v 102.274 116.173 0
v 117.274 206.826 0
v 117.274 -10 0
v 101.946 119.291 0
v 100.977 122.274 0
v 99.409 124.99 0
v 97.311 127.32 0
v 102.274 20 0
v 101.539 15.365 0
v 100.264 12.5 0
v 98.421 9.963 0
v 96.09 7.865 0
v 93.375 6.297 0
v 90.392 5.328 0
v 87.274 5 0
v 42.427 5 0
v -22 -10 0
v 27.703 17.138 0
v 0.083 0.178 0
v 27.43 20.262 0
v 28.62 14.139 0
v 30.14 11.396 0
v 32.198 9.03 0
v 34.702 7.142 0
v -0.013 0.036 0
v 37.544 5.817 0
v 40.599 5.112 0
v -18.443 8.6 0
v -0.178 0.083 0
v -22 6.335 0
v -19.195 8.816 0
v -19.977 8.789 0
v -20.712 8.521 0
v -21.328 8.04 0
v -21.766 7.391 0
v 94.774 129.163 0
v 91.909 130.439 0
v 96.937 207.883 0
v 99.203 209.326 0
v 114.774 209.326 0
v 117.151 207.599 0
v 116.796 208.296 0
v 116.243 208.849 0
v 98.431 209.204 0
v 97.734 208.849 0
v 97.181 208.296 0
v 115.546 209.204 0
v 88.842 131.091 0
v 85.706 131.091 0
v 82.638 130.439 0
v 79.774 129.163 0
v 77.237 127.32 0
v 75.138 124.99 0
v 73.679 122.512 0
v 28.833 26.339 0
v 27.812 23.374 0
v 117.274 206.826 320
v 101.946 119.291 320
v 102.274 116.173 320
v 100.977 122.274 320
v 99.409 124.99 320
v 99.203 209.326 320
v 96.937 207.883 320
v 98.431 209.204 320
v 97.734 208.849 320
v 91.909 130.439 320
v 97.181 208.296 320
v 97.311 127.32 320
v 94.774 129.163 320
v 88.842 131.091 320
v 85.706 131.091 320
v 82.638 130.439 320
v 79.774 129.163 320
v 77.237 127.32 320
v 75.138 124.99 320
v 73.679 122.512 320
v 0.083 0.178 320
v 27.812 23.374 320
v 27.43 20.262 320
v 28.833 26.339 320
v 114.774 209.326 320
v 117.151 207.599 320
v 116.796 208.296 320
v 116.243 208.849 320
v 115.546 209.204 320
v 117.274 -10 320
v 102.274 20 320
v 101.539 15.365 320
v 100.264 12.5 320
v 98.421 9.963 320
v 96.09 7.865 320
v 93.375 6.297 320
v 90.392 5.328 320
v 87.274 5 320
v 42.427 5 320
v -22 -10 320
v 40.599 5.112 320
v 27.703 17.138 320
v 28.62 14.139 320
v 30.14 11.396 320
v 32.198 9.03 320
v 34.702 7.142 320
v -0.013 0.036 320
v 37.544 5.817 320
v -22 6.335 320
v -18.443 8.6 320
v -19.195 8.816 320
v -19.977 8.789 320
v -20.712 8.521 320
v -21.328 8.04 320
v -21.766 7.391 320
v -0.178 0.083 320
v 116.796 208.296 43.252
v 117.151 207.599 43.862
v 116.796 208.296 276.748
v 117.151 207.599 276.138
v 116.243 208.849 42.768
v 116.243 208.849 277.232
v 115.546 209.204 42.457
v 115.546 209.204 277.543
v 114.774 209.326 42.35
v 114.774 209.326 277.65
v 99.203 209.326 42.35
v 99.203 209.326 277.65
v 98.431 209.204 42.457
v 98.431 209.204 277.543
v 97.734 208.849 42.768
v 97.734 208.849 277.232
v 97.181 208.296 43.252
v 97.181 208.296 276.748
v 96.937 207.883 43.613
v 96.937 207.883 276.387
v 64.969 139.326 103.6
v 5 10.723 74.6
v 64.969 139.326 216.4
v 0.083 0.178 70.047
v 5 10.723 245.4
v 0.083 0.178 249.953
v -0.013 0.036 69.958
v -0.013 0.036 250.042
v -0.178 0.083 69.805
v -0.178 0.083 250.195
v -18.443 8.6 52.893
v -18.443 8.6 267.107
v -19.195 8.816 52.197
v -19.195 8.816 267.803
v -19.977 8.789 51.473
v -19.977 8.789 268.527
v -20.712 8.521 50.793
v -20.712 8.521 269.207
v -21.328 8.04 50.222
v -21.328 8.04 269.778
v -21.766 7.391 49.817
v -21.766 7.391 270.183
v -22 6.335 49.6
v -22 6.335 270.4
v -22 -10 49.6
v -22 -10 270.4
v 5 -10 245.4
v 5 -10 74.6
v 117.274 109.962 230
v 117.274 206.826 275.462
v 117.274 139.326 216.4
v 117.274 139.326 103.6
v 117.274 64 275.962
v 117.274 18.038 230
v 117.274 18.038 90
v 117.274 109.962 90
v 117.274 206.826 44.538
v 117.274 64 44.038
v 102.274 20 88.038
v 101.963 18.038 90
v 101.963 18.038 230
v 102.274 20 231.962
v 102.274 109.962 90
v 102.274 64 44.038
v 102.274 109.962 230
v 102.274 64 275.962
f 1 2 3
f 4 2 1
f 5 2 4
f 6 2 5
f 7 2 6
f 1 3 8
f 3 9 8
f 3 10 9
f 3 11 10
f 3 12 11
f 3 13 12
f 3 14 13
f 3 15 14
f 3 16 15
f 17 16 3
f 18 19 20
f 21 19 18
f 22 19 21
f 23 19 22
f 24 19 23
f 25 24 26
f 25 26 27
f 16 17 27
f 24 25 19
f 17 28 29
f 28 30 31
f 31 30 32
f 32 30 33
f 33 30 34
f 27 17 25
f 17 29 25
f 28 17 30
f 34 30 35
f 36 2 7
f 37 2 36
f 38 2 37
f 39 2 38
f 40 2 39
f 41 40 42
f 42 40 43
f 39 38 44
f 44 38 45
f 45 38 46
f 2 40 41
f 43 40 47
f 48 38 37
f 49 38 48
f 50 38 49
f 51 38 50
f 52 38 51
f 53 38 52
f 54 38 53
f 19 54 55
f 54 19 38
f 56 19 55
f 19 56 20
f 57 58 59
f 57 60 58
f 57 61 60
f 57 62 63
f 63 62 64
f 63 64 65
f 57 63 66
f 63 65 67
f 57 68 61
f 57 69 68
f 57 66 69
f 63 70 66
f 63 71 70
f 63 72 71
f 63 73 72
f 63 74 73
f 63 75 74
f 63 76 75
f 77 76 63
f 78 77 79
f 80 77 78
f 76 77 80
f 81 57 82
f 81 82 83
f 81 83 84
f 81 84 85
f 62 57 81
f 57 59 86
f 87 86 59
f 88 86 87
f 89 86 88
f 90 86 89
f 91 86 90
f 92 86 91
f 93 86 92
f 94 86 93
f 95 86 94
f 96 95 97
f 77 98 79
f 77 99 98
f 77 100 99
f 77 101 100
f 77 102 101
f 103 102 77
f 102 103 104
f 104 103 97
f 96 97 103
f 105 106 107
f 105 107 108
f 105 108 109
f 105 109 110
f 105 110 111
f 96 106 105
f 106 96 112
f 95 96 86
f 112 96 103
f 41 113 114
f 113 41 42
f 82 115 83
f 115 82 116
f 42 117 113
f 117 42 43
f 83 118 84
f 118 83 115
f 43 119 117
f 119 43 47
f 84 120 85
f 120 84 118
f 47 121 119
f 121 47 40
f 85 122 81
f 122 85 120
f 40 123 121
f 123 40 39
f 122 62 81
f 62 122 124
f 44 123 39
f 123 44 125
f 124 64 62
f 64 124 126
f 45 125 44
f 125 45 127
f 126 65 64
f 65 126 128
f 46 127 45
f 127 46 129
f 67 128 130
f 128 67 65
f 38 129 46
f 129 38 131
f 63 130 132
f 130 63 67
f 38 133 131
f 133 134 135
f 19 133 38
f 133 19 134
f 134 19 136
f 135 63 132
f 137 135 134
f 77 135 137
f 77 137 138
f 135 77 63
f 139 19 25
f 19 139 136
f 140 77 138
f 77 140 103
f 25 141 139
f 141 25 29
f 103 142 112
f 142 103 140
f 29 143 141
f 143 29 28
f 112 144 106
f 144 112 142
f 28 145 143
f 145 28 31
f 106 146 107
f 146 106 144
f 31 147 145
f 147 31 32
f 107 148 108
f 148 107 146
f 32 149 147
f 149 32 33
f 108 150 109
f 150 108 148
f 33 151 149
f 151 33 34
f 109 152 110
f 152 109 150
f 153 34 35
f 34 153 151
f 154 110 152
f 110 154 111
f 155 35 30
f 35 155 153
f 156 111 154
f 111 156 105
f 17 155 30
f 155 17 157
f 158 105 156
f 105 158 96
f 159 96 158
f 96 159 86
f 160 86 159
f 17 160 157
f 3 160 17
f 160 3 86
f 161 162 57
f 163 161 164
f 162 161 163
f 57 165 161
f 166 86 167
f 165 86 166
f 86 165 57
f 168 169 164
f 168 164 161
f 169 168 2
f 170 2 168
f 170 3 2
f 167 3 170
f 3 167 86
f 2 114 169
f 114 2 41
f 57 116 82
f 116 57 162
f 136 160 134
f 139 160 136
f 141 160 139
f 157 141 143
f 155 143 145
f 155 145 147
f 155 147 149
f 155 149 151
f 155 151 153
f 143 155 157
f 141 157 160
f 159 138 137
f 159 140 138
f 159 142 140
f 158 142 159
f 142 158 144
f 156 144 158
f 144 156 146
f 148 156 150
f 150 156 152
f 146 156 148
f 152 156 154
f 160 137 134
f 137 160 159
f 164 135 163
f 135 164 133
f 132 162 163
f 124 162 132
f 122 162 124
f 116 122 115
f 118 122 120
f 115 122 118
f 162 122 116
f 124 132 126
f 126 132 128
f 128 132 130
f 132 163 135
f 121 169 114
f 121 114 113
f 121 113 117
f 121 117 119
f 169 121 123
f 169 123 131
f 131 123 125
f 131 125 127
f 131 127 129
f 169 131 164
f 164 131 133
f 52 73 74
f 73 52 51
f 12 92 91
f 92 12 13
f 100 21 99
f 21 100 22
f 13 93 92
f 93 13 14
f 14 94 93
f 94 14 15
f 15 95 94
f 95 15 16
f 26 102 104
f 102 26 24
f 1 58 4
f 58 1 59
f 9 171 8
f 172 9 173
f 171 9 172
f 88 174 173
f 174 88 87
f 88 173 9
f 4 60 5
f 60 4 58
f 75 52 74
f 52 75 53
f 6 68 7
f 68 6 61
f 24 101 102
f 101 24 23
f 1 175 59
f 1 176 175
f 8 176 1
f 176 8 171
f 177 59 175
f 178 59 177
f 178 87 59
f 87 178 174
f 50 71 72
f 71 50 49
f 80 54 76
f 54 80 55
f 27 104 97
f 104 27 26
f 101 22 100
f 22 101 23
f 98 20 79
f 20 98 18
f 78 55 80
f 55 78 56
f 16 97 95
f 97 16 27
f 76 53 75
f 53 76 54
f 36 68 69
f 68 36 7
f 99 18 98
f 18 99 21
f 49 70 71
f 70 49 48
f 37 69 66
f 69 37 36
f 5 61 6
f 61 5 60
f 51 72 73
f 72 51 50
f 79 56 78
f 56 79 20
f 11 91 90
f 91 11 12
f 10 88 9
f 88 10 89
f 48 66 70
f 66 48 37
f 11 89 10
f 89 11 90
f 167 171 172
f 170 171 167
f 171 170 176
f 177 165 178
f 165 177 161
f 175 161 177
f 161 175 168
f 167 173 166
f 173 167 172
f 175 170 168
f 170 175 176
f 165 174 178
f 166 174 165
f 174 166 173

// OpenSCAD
width = 320;
laptop_depth = 242;
angle = 25;

extra_back = 15;
lip = 22;
lift = 10;

module profile_2d() {
  roundoff = 2.5;
  $fn = 20;

  offset(r=roundoff)
  offset(r=-roundoff)
  difference() {
    translate([-lip, -lift])
    square([lip + extra_back + laptop_depth * sin(angle), lift + laptop_depth * cos(angle) - 10]);
    
    rotate([0, 0, 90-angle])
    square(500);
  }

  // Don't round off the bottom corners.
  translate([-lip, -lift])
  square([lip + extra_back + laptop_depth * sin(angle), lift]);
}

module piece() {
  front_cutout_width = width * 0.69;
  front_cutout_slope = 25;

  back_cutout_width = width * 0.79;
  back_cutout_slope = 70;
  
  difference() {
    linear_extrude(width)
    profile_2d();
    
    // Front cutout, for the front protrusion on the lid.
    translate([0, 0, (width-front_cutout_width)/2])
    hull() {
      linear_extrude(front_cutout_width)
      translate([-lip-100, 0])
      square(200, center=true);
      
      translate([0, 0, front_cutout_slope])
      linear_extrude(front_cutout_width - 2*front_cutout_slope)
      translate([-95, 0])
      square(200, center=true);
    }
    
    // Back cutout, for fingers.
    translate([0, 0, (width-back_cutout_width)/2])
    hull() {
      linear_extrude(back_cutout_width)
      translate([0, 200 + laptop_depth * cos(angle)])
      square(400, center=true);
      
      translate([0, 0, back_cutout_slope])
      linear_extrude(back_cutout_width - 2*back_cutout_slope)
      translate([0, 200 + laptop_depth * cos(angle) - 80])
      square(400, center=true);
    }
    
    // Inner hollow space.
    wall = 15;
    roundoff = 15;
    translate([0, 0, -1])
    linear_extrude(width+2)
    offset(r=roundoff)
    offset(-wall-roundoff)
    profile_2d();
    
    // Weight saving cutout on the back.
    hull()
    for (z = [90, width-90])
    translate([290, 64, z])
    rotate([45, 0, 0])
    cube([400, 65, 65], center=true);
  }
}

render()
//rotate([90, 0])
piece();
